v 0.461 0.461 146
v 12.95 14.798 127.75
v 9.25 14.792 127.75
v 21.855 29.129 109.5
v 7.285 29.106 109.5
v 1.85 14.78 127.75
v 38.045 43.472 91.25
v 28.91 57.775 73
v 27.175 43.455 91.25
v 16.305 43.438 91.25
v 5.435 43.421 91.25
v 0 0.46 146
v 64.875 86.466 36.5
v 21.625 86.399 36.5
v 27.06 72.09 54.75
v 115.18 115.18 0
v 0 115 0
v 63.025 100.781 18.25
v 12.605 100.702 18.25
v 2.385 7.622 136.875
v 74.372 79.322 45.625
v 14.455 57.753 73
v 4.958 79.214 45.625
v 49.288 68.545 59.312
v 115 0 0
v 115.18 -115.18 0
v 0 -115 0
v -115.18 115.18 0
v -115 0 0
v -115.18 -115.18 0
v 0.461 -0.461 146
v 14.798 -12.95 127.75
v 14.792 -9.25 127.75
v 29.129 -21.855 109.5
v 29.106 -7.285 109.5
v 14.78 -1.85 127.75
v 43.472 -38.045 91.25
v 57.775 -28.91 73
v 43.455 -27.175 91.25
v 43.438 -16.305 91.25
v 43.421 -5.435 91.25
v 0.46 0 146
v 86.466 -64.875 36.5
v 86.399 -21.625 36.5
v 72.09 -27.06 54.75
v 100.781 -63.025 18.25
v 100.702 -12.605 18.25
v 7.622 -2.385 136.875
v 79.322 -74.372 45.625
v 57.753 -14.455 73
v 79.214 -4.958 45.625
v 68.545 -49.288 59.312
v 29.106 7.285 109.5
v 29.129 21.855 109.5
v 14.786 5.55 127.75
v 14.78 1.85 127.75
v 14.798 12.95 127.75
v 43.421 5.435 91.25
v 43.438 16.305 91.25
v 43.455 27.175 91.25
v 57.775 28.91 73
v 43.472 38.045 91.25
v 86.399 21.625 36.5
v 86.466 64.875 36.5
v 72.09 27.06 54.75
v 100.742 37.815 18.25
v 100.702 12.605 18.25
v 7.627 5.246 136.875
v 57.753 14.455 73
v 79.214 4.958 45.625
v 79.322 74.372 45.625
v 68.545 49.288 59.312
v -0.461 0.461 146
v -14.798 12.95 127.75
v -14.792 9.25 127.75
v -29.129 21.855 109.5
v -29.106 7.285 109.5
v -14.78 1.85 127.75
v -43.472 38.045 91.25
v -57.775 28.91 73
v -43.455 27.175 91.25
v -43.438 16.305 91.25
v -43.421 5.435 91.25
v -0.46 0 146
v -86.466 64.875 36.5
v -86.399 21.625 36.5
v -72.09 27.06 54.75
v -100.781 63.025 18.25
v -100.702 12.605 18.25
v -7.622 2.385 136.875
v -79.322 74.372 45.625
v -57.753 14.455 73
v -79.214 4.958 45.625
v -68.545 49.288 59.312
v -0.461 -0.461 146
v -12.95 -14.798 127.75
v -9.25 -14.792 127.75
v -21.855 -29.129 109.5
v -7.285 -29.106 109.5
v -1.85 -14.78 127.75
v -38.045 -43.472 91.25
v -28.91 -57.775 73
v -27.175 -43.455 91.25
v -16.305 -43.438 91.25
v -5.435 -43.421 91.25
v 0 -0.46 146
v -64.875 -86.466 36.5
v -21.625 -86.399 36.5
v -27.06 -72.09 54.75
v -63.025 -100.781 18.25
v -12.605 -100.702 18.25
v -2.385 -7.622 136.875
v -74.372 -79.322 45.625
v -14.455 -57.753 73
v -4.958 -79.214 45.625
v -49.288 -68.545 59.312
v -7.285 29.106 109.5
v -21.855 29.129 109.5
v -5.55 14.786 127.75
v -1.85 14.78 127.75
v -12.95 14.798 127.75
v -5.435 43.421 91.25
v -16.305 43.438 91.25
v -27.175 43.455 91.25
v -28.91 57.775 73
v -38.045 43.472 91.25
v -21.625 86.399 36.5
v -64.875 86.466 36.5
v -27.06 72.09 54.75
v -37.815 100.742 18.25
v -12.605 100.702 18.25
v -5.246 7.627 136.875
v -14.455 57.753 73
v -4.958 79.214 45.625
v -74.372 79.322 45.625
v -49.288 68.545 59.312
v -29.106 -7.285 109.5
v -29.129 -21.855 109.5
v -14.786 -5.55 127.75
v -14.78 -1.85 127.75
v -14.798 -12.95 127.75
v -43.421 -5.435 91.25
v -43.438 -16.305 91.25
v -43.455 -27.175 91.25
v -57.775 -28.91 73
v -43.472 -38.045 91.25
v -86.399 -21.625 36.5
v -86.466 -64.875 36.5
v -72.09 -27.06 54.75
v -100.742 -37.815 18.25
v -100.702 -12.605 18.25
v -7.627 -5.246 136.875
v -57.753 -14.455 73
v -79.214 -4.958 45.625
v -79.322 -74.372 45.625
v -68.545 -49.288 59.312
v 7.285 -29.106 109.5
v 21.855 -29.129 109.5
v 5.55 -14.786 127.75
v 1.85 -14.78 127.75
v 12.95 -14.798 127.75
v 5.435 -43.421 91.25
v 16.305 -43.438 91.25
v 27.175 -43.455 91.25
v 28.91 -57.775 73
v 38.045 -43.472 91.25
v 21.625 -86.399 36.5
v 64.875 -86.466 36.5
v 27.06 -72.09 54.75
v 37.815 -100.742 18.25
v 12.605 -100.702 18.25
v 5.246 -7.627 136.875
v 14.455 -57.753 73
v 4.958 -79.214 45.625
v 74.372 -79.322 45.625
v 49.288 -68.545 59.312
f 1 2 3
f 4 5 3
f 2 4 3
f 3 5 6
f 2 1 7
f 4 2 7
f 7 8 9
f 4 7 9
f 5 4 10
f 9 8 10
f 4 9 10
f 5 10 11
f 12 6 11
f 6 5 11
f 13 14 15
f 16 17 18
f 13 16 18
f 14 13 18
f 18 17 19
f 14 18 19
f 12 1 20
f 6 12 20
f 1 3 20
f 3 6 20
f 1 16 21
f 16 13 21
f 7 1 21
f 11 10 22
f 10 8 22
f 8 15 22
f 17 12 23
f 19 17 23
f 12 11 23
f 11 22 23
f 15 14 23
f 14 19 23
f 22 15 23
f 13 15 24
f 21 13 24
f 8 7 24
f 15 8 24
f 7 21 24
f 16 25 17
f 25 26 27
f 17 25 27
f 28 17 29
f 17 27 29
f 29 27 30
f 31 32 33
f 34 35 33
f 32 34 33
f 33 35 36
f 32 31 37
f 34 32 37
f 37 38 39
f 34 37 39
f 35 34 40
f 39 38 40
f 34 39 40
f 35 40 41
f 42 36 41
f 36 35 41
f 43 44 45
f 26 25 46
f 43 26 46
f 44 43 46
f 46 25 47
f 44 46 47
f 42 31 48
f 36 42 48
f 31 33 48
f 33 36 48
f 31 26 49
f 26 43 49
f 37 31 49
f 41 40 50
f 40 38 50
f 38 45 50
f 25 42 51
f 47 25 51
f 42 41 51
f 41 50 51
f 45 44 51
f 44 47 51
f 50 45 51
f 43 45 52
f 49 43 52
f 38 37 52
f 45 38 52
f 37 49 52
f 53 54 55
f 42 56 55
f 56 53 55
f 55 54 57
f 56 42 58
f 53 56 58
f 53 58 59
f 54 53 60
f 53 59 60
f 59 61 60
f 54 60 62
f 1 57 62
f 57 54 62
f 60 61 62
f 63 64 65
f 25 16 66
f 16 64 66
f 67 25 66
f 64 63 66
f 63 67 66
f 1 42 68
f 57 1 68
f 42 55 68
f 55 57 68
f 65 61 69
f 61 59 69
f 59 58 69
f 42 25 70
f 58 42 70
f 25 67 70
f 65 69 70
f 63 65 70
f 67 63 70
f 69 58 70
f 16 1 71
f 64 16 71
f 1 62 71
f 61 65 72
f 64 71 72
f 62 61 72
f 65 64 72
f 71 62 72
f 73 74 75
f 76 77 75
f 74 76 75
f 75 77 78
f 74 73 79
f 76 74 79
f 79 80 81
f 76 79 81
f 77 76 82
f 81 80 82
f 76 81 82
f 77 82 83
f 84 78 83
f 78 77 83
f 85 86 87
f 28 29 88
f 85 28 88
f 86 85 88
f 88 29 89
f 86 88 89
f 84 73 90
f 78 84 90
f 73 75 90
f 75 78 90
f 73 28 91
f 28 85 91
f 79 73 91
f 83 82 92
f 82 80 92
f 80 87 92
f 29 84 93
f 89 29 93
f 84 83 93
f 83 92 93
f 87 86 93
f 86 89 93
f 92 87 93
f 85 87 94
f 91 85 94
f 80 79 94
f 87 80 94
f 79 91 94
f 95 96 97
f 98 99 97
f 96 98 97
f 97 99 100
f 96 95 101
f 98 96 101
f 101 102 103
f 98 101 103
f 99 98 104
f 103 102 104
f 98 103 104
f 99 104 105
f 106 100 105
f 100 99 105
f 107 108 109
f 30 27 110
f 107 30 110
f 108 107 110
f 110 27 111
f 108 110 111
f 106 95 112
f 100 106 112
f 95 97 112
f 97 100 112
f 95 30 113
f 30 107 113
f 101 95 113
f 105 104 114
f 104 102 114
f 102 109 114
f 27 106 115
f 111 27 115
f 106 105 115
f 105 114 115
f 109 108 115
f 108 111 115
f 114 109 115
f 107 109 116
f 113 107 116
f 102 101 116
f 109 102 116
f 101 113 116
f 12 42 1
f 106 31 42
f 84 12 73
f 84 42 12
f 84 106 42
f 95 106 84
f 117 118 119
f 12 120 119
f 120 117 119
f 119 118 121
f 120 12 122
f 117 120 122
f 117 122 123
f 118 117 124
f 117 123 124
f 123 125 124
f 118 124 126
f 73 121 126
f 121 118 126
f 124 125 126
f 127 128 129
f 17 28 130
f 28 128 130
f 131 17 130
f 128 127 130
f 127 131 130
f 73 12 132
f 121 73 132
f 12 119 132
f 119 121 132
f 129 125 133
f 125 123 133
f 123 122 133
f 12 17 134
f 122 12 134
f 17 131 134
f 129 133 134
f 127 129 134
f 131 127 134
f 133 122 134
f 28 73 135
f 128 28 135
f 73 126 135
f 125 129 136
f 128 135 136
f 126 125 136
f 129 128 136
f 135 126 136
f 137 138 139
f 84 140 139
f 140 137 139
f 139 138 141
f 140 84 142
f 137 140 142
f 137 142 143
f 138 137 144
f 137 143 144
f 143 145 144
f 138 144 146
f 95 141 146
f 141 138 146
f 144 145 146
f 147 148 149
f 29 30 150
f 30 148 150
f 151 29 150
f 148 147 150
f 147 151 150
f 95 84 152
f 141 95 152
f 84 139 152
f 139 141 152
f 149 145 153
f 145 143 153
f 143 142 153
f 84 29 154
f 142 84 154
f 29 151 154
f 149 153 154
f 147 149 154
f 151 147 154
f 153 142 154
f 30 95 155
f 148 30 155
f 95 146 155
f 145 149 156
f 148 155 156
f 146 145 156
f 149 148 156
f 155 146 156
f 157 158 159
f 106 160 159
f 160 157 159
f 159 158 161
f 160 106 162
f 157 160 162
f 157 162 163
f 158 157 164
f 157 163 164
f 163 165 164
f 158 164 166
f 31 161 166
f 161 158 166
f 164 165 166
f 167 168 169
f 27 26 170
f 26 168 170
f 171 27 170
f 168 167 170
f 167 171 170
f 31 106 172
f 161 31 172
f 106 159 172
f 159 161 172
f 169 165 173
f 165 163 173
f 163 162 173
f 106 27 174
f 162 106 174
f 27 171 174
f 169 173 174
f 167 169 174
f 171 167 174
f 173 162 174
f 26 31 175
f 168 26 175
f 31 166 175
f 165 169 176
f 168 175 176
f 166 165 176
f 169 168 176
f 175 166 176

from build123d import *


# Not quite as in the source:
# - a feature of the source that left no trace in its solid (it failed there, or was rolled back) is left out


with BuildPart() as f3:
    # F2 (on offset) → F3 section 0
    with BuildSketch(Plane.XY.offset(146)):
        Polygon((0.4598601322, 0), (0.4605799133, 0.4605799133), (0, 0.4598601322), (-0.4605799133, 0.4605799133), (-0.4598601322, 0), (-0.4605799133, -0.4605799133), (0, -0.4598601322), (0.4605799133, -0.4605799133), align=None)
    # F0 (on Top) → F3 section 1
    with BuildSketch(Plane.XY):
        Polygon((0, 115), (-115.18, 115.18), (-115, 0), (-115.18, -115.18), (0, -115), (115.18, -115.18), (115, 0), (115.18, 115.18), align=None)
    loft()


solid = f3.part
